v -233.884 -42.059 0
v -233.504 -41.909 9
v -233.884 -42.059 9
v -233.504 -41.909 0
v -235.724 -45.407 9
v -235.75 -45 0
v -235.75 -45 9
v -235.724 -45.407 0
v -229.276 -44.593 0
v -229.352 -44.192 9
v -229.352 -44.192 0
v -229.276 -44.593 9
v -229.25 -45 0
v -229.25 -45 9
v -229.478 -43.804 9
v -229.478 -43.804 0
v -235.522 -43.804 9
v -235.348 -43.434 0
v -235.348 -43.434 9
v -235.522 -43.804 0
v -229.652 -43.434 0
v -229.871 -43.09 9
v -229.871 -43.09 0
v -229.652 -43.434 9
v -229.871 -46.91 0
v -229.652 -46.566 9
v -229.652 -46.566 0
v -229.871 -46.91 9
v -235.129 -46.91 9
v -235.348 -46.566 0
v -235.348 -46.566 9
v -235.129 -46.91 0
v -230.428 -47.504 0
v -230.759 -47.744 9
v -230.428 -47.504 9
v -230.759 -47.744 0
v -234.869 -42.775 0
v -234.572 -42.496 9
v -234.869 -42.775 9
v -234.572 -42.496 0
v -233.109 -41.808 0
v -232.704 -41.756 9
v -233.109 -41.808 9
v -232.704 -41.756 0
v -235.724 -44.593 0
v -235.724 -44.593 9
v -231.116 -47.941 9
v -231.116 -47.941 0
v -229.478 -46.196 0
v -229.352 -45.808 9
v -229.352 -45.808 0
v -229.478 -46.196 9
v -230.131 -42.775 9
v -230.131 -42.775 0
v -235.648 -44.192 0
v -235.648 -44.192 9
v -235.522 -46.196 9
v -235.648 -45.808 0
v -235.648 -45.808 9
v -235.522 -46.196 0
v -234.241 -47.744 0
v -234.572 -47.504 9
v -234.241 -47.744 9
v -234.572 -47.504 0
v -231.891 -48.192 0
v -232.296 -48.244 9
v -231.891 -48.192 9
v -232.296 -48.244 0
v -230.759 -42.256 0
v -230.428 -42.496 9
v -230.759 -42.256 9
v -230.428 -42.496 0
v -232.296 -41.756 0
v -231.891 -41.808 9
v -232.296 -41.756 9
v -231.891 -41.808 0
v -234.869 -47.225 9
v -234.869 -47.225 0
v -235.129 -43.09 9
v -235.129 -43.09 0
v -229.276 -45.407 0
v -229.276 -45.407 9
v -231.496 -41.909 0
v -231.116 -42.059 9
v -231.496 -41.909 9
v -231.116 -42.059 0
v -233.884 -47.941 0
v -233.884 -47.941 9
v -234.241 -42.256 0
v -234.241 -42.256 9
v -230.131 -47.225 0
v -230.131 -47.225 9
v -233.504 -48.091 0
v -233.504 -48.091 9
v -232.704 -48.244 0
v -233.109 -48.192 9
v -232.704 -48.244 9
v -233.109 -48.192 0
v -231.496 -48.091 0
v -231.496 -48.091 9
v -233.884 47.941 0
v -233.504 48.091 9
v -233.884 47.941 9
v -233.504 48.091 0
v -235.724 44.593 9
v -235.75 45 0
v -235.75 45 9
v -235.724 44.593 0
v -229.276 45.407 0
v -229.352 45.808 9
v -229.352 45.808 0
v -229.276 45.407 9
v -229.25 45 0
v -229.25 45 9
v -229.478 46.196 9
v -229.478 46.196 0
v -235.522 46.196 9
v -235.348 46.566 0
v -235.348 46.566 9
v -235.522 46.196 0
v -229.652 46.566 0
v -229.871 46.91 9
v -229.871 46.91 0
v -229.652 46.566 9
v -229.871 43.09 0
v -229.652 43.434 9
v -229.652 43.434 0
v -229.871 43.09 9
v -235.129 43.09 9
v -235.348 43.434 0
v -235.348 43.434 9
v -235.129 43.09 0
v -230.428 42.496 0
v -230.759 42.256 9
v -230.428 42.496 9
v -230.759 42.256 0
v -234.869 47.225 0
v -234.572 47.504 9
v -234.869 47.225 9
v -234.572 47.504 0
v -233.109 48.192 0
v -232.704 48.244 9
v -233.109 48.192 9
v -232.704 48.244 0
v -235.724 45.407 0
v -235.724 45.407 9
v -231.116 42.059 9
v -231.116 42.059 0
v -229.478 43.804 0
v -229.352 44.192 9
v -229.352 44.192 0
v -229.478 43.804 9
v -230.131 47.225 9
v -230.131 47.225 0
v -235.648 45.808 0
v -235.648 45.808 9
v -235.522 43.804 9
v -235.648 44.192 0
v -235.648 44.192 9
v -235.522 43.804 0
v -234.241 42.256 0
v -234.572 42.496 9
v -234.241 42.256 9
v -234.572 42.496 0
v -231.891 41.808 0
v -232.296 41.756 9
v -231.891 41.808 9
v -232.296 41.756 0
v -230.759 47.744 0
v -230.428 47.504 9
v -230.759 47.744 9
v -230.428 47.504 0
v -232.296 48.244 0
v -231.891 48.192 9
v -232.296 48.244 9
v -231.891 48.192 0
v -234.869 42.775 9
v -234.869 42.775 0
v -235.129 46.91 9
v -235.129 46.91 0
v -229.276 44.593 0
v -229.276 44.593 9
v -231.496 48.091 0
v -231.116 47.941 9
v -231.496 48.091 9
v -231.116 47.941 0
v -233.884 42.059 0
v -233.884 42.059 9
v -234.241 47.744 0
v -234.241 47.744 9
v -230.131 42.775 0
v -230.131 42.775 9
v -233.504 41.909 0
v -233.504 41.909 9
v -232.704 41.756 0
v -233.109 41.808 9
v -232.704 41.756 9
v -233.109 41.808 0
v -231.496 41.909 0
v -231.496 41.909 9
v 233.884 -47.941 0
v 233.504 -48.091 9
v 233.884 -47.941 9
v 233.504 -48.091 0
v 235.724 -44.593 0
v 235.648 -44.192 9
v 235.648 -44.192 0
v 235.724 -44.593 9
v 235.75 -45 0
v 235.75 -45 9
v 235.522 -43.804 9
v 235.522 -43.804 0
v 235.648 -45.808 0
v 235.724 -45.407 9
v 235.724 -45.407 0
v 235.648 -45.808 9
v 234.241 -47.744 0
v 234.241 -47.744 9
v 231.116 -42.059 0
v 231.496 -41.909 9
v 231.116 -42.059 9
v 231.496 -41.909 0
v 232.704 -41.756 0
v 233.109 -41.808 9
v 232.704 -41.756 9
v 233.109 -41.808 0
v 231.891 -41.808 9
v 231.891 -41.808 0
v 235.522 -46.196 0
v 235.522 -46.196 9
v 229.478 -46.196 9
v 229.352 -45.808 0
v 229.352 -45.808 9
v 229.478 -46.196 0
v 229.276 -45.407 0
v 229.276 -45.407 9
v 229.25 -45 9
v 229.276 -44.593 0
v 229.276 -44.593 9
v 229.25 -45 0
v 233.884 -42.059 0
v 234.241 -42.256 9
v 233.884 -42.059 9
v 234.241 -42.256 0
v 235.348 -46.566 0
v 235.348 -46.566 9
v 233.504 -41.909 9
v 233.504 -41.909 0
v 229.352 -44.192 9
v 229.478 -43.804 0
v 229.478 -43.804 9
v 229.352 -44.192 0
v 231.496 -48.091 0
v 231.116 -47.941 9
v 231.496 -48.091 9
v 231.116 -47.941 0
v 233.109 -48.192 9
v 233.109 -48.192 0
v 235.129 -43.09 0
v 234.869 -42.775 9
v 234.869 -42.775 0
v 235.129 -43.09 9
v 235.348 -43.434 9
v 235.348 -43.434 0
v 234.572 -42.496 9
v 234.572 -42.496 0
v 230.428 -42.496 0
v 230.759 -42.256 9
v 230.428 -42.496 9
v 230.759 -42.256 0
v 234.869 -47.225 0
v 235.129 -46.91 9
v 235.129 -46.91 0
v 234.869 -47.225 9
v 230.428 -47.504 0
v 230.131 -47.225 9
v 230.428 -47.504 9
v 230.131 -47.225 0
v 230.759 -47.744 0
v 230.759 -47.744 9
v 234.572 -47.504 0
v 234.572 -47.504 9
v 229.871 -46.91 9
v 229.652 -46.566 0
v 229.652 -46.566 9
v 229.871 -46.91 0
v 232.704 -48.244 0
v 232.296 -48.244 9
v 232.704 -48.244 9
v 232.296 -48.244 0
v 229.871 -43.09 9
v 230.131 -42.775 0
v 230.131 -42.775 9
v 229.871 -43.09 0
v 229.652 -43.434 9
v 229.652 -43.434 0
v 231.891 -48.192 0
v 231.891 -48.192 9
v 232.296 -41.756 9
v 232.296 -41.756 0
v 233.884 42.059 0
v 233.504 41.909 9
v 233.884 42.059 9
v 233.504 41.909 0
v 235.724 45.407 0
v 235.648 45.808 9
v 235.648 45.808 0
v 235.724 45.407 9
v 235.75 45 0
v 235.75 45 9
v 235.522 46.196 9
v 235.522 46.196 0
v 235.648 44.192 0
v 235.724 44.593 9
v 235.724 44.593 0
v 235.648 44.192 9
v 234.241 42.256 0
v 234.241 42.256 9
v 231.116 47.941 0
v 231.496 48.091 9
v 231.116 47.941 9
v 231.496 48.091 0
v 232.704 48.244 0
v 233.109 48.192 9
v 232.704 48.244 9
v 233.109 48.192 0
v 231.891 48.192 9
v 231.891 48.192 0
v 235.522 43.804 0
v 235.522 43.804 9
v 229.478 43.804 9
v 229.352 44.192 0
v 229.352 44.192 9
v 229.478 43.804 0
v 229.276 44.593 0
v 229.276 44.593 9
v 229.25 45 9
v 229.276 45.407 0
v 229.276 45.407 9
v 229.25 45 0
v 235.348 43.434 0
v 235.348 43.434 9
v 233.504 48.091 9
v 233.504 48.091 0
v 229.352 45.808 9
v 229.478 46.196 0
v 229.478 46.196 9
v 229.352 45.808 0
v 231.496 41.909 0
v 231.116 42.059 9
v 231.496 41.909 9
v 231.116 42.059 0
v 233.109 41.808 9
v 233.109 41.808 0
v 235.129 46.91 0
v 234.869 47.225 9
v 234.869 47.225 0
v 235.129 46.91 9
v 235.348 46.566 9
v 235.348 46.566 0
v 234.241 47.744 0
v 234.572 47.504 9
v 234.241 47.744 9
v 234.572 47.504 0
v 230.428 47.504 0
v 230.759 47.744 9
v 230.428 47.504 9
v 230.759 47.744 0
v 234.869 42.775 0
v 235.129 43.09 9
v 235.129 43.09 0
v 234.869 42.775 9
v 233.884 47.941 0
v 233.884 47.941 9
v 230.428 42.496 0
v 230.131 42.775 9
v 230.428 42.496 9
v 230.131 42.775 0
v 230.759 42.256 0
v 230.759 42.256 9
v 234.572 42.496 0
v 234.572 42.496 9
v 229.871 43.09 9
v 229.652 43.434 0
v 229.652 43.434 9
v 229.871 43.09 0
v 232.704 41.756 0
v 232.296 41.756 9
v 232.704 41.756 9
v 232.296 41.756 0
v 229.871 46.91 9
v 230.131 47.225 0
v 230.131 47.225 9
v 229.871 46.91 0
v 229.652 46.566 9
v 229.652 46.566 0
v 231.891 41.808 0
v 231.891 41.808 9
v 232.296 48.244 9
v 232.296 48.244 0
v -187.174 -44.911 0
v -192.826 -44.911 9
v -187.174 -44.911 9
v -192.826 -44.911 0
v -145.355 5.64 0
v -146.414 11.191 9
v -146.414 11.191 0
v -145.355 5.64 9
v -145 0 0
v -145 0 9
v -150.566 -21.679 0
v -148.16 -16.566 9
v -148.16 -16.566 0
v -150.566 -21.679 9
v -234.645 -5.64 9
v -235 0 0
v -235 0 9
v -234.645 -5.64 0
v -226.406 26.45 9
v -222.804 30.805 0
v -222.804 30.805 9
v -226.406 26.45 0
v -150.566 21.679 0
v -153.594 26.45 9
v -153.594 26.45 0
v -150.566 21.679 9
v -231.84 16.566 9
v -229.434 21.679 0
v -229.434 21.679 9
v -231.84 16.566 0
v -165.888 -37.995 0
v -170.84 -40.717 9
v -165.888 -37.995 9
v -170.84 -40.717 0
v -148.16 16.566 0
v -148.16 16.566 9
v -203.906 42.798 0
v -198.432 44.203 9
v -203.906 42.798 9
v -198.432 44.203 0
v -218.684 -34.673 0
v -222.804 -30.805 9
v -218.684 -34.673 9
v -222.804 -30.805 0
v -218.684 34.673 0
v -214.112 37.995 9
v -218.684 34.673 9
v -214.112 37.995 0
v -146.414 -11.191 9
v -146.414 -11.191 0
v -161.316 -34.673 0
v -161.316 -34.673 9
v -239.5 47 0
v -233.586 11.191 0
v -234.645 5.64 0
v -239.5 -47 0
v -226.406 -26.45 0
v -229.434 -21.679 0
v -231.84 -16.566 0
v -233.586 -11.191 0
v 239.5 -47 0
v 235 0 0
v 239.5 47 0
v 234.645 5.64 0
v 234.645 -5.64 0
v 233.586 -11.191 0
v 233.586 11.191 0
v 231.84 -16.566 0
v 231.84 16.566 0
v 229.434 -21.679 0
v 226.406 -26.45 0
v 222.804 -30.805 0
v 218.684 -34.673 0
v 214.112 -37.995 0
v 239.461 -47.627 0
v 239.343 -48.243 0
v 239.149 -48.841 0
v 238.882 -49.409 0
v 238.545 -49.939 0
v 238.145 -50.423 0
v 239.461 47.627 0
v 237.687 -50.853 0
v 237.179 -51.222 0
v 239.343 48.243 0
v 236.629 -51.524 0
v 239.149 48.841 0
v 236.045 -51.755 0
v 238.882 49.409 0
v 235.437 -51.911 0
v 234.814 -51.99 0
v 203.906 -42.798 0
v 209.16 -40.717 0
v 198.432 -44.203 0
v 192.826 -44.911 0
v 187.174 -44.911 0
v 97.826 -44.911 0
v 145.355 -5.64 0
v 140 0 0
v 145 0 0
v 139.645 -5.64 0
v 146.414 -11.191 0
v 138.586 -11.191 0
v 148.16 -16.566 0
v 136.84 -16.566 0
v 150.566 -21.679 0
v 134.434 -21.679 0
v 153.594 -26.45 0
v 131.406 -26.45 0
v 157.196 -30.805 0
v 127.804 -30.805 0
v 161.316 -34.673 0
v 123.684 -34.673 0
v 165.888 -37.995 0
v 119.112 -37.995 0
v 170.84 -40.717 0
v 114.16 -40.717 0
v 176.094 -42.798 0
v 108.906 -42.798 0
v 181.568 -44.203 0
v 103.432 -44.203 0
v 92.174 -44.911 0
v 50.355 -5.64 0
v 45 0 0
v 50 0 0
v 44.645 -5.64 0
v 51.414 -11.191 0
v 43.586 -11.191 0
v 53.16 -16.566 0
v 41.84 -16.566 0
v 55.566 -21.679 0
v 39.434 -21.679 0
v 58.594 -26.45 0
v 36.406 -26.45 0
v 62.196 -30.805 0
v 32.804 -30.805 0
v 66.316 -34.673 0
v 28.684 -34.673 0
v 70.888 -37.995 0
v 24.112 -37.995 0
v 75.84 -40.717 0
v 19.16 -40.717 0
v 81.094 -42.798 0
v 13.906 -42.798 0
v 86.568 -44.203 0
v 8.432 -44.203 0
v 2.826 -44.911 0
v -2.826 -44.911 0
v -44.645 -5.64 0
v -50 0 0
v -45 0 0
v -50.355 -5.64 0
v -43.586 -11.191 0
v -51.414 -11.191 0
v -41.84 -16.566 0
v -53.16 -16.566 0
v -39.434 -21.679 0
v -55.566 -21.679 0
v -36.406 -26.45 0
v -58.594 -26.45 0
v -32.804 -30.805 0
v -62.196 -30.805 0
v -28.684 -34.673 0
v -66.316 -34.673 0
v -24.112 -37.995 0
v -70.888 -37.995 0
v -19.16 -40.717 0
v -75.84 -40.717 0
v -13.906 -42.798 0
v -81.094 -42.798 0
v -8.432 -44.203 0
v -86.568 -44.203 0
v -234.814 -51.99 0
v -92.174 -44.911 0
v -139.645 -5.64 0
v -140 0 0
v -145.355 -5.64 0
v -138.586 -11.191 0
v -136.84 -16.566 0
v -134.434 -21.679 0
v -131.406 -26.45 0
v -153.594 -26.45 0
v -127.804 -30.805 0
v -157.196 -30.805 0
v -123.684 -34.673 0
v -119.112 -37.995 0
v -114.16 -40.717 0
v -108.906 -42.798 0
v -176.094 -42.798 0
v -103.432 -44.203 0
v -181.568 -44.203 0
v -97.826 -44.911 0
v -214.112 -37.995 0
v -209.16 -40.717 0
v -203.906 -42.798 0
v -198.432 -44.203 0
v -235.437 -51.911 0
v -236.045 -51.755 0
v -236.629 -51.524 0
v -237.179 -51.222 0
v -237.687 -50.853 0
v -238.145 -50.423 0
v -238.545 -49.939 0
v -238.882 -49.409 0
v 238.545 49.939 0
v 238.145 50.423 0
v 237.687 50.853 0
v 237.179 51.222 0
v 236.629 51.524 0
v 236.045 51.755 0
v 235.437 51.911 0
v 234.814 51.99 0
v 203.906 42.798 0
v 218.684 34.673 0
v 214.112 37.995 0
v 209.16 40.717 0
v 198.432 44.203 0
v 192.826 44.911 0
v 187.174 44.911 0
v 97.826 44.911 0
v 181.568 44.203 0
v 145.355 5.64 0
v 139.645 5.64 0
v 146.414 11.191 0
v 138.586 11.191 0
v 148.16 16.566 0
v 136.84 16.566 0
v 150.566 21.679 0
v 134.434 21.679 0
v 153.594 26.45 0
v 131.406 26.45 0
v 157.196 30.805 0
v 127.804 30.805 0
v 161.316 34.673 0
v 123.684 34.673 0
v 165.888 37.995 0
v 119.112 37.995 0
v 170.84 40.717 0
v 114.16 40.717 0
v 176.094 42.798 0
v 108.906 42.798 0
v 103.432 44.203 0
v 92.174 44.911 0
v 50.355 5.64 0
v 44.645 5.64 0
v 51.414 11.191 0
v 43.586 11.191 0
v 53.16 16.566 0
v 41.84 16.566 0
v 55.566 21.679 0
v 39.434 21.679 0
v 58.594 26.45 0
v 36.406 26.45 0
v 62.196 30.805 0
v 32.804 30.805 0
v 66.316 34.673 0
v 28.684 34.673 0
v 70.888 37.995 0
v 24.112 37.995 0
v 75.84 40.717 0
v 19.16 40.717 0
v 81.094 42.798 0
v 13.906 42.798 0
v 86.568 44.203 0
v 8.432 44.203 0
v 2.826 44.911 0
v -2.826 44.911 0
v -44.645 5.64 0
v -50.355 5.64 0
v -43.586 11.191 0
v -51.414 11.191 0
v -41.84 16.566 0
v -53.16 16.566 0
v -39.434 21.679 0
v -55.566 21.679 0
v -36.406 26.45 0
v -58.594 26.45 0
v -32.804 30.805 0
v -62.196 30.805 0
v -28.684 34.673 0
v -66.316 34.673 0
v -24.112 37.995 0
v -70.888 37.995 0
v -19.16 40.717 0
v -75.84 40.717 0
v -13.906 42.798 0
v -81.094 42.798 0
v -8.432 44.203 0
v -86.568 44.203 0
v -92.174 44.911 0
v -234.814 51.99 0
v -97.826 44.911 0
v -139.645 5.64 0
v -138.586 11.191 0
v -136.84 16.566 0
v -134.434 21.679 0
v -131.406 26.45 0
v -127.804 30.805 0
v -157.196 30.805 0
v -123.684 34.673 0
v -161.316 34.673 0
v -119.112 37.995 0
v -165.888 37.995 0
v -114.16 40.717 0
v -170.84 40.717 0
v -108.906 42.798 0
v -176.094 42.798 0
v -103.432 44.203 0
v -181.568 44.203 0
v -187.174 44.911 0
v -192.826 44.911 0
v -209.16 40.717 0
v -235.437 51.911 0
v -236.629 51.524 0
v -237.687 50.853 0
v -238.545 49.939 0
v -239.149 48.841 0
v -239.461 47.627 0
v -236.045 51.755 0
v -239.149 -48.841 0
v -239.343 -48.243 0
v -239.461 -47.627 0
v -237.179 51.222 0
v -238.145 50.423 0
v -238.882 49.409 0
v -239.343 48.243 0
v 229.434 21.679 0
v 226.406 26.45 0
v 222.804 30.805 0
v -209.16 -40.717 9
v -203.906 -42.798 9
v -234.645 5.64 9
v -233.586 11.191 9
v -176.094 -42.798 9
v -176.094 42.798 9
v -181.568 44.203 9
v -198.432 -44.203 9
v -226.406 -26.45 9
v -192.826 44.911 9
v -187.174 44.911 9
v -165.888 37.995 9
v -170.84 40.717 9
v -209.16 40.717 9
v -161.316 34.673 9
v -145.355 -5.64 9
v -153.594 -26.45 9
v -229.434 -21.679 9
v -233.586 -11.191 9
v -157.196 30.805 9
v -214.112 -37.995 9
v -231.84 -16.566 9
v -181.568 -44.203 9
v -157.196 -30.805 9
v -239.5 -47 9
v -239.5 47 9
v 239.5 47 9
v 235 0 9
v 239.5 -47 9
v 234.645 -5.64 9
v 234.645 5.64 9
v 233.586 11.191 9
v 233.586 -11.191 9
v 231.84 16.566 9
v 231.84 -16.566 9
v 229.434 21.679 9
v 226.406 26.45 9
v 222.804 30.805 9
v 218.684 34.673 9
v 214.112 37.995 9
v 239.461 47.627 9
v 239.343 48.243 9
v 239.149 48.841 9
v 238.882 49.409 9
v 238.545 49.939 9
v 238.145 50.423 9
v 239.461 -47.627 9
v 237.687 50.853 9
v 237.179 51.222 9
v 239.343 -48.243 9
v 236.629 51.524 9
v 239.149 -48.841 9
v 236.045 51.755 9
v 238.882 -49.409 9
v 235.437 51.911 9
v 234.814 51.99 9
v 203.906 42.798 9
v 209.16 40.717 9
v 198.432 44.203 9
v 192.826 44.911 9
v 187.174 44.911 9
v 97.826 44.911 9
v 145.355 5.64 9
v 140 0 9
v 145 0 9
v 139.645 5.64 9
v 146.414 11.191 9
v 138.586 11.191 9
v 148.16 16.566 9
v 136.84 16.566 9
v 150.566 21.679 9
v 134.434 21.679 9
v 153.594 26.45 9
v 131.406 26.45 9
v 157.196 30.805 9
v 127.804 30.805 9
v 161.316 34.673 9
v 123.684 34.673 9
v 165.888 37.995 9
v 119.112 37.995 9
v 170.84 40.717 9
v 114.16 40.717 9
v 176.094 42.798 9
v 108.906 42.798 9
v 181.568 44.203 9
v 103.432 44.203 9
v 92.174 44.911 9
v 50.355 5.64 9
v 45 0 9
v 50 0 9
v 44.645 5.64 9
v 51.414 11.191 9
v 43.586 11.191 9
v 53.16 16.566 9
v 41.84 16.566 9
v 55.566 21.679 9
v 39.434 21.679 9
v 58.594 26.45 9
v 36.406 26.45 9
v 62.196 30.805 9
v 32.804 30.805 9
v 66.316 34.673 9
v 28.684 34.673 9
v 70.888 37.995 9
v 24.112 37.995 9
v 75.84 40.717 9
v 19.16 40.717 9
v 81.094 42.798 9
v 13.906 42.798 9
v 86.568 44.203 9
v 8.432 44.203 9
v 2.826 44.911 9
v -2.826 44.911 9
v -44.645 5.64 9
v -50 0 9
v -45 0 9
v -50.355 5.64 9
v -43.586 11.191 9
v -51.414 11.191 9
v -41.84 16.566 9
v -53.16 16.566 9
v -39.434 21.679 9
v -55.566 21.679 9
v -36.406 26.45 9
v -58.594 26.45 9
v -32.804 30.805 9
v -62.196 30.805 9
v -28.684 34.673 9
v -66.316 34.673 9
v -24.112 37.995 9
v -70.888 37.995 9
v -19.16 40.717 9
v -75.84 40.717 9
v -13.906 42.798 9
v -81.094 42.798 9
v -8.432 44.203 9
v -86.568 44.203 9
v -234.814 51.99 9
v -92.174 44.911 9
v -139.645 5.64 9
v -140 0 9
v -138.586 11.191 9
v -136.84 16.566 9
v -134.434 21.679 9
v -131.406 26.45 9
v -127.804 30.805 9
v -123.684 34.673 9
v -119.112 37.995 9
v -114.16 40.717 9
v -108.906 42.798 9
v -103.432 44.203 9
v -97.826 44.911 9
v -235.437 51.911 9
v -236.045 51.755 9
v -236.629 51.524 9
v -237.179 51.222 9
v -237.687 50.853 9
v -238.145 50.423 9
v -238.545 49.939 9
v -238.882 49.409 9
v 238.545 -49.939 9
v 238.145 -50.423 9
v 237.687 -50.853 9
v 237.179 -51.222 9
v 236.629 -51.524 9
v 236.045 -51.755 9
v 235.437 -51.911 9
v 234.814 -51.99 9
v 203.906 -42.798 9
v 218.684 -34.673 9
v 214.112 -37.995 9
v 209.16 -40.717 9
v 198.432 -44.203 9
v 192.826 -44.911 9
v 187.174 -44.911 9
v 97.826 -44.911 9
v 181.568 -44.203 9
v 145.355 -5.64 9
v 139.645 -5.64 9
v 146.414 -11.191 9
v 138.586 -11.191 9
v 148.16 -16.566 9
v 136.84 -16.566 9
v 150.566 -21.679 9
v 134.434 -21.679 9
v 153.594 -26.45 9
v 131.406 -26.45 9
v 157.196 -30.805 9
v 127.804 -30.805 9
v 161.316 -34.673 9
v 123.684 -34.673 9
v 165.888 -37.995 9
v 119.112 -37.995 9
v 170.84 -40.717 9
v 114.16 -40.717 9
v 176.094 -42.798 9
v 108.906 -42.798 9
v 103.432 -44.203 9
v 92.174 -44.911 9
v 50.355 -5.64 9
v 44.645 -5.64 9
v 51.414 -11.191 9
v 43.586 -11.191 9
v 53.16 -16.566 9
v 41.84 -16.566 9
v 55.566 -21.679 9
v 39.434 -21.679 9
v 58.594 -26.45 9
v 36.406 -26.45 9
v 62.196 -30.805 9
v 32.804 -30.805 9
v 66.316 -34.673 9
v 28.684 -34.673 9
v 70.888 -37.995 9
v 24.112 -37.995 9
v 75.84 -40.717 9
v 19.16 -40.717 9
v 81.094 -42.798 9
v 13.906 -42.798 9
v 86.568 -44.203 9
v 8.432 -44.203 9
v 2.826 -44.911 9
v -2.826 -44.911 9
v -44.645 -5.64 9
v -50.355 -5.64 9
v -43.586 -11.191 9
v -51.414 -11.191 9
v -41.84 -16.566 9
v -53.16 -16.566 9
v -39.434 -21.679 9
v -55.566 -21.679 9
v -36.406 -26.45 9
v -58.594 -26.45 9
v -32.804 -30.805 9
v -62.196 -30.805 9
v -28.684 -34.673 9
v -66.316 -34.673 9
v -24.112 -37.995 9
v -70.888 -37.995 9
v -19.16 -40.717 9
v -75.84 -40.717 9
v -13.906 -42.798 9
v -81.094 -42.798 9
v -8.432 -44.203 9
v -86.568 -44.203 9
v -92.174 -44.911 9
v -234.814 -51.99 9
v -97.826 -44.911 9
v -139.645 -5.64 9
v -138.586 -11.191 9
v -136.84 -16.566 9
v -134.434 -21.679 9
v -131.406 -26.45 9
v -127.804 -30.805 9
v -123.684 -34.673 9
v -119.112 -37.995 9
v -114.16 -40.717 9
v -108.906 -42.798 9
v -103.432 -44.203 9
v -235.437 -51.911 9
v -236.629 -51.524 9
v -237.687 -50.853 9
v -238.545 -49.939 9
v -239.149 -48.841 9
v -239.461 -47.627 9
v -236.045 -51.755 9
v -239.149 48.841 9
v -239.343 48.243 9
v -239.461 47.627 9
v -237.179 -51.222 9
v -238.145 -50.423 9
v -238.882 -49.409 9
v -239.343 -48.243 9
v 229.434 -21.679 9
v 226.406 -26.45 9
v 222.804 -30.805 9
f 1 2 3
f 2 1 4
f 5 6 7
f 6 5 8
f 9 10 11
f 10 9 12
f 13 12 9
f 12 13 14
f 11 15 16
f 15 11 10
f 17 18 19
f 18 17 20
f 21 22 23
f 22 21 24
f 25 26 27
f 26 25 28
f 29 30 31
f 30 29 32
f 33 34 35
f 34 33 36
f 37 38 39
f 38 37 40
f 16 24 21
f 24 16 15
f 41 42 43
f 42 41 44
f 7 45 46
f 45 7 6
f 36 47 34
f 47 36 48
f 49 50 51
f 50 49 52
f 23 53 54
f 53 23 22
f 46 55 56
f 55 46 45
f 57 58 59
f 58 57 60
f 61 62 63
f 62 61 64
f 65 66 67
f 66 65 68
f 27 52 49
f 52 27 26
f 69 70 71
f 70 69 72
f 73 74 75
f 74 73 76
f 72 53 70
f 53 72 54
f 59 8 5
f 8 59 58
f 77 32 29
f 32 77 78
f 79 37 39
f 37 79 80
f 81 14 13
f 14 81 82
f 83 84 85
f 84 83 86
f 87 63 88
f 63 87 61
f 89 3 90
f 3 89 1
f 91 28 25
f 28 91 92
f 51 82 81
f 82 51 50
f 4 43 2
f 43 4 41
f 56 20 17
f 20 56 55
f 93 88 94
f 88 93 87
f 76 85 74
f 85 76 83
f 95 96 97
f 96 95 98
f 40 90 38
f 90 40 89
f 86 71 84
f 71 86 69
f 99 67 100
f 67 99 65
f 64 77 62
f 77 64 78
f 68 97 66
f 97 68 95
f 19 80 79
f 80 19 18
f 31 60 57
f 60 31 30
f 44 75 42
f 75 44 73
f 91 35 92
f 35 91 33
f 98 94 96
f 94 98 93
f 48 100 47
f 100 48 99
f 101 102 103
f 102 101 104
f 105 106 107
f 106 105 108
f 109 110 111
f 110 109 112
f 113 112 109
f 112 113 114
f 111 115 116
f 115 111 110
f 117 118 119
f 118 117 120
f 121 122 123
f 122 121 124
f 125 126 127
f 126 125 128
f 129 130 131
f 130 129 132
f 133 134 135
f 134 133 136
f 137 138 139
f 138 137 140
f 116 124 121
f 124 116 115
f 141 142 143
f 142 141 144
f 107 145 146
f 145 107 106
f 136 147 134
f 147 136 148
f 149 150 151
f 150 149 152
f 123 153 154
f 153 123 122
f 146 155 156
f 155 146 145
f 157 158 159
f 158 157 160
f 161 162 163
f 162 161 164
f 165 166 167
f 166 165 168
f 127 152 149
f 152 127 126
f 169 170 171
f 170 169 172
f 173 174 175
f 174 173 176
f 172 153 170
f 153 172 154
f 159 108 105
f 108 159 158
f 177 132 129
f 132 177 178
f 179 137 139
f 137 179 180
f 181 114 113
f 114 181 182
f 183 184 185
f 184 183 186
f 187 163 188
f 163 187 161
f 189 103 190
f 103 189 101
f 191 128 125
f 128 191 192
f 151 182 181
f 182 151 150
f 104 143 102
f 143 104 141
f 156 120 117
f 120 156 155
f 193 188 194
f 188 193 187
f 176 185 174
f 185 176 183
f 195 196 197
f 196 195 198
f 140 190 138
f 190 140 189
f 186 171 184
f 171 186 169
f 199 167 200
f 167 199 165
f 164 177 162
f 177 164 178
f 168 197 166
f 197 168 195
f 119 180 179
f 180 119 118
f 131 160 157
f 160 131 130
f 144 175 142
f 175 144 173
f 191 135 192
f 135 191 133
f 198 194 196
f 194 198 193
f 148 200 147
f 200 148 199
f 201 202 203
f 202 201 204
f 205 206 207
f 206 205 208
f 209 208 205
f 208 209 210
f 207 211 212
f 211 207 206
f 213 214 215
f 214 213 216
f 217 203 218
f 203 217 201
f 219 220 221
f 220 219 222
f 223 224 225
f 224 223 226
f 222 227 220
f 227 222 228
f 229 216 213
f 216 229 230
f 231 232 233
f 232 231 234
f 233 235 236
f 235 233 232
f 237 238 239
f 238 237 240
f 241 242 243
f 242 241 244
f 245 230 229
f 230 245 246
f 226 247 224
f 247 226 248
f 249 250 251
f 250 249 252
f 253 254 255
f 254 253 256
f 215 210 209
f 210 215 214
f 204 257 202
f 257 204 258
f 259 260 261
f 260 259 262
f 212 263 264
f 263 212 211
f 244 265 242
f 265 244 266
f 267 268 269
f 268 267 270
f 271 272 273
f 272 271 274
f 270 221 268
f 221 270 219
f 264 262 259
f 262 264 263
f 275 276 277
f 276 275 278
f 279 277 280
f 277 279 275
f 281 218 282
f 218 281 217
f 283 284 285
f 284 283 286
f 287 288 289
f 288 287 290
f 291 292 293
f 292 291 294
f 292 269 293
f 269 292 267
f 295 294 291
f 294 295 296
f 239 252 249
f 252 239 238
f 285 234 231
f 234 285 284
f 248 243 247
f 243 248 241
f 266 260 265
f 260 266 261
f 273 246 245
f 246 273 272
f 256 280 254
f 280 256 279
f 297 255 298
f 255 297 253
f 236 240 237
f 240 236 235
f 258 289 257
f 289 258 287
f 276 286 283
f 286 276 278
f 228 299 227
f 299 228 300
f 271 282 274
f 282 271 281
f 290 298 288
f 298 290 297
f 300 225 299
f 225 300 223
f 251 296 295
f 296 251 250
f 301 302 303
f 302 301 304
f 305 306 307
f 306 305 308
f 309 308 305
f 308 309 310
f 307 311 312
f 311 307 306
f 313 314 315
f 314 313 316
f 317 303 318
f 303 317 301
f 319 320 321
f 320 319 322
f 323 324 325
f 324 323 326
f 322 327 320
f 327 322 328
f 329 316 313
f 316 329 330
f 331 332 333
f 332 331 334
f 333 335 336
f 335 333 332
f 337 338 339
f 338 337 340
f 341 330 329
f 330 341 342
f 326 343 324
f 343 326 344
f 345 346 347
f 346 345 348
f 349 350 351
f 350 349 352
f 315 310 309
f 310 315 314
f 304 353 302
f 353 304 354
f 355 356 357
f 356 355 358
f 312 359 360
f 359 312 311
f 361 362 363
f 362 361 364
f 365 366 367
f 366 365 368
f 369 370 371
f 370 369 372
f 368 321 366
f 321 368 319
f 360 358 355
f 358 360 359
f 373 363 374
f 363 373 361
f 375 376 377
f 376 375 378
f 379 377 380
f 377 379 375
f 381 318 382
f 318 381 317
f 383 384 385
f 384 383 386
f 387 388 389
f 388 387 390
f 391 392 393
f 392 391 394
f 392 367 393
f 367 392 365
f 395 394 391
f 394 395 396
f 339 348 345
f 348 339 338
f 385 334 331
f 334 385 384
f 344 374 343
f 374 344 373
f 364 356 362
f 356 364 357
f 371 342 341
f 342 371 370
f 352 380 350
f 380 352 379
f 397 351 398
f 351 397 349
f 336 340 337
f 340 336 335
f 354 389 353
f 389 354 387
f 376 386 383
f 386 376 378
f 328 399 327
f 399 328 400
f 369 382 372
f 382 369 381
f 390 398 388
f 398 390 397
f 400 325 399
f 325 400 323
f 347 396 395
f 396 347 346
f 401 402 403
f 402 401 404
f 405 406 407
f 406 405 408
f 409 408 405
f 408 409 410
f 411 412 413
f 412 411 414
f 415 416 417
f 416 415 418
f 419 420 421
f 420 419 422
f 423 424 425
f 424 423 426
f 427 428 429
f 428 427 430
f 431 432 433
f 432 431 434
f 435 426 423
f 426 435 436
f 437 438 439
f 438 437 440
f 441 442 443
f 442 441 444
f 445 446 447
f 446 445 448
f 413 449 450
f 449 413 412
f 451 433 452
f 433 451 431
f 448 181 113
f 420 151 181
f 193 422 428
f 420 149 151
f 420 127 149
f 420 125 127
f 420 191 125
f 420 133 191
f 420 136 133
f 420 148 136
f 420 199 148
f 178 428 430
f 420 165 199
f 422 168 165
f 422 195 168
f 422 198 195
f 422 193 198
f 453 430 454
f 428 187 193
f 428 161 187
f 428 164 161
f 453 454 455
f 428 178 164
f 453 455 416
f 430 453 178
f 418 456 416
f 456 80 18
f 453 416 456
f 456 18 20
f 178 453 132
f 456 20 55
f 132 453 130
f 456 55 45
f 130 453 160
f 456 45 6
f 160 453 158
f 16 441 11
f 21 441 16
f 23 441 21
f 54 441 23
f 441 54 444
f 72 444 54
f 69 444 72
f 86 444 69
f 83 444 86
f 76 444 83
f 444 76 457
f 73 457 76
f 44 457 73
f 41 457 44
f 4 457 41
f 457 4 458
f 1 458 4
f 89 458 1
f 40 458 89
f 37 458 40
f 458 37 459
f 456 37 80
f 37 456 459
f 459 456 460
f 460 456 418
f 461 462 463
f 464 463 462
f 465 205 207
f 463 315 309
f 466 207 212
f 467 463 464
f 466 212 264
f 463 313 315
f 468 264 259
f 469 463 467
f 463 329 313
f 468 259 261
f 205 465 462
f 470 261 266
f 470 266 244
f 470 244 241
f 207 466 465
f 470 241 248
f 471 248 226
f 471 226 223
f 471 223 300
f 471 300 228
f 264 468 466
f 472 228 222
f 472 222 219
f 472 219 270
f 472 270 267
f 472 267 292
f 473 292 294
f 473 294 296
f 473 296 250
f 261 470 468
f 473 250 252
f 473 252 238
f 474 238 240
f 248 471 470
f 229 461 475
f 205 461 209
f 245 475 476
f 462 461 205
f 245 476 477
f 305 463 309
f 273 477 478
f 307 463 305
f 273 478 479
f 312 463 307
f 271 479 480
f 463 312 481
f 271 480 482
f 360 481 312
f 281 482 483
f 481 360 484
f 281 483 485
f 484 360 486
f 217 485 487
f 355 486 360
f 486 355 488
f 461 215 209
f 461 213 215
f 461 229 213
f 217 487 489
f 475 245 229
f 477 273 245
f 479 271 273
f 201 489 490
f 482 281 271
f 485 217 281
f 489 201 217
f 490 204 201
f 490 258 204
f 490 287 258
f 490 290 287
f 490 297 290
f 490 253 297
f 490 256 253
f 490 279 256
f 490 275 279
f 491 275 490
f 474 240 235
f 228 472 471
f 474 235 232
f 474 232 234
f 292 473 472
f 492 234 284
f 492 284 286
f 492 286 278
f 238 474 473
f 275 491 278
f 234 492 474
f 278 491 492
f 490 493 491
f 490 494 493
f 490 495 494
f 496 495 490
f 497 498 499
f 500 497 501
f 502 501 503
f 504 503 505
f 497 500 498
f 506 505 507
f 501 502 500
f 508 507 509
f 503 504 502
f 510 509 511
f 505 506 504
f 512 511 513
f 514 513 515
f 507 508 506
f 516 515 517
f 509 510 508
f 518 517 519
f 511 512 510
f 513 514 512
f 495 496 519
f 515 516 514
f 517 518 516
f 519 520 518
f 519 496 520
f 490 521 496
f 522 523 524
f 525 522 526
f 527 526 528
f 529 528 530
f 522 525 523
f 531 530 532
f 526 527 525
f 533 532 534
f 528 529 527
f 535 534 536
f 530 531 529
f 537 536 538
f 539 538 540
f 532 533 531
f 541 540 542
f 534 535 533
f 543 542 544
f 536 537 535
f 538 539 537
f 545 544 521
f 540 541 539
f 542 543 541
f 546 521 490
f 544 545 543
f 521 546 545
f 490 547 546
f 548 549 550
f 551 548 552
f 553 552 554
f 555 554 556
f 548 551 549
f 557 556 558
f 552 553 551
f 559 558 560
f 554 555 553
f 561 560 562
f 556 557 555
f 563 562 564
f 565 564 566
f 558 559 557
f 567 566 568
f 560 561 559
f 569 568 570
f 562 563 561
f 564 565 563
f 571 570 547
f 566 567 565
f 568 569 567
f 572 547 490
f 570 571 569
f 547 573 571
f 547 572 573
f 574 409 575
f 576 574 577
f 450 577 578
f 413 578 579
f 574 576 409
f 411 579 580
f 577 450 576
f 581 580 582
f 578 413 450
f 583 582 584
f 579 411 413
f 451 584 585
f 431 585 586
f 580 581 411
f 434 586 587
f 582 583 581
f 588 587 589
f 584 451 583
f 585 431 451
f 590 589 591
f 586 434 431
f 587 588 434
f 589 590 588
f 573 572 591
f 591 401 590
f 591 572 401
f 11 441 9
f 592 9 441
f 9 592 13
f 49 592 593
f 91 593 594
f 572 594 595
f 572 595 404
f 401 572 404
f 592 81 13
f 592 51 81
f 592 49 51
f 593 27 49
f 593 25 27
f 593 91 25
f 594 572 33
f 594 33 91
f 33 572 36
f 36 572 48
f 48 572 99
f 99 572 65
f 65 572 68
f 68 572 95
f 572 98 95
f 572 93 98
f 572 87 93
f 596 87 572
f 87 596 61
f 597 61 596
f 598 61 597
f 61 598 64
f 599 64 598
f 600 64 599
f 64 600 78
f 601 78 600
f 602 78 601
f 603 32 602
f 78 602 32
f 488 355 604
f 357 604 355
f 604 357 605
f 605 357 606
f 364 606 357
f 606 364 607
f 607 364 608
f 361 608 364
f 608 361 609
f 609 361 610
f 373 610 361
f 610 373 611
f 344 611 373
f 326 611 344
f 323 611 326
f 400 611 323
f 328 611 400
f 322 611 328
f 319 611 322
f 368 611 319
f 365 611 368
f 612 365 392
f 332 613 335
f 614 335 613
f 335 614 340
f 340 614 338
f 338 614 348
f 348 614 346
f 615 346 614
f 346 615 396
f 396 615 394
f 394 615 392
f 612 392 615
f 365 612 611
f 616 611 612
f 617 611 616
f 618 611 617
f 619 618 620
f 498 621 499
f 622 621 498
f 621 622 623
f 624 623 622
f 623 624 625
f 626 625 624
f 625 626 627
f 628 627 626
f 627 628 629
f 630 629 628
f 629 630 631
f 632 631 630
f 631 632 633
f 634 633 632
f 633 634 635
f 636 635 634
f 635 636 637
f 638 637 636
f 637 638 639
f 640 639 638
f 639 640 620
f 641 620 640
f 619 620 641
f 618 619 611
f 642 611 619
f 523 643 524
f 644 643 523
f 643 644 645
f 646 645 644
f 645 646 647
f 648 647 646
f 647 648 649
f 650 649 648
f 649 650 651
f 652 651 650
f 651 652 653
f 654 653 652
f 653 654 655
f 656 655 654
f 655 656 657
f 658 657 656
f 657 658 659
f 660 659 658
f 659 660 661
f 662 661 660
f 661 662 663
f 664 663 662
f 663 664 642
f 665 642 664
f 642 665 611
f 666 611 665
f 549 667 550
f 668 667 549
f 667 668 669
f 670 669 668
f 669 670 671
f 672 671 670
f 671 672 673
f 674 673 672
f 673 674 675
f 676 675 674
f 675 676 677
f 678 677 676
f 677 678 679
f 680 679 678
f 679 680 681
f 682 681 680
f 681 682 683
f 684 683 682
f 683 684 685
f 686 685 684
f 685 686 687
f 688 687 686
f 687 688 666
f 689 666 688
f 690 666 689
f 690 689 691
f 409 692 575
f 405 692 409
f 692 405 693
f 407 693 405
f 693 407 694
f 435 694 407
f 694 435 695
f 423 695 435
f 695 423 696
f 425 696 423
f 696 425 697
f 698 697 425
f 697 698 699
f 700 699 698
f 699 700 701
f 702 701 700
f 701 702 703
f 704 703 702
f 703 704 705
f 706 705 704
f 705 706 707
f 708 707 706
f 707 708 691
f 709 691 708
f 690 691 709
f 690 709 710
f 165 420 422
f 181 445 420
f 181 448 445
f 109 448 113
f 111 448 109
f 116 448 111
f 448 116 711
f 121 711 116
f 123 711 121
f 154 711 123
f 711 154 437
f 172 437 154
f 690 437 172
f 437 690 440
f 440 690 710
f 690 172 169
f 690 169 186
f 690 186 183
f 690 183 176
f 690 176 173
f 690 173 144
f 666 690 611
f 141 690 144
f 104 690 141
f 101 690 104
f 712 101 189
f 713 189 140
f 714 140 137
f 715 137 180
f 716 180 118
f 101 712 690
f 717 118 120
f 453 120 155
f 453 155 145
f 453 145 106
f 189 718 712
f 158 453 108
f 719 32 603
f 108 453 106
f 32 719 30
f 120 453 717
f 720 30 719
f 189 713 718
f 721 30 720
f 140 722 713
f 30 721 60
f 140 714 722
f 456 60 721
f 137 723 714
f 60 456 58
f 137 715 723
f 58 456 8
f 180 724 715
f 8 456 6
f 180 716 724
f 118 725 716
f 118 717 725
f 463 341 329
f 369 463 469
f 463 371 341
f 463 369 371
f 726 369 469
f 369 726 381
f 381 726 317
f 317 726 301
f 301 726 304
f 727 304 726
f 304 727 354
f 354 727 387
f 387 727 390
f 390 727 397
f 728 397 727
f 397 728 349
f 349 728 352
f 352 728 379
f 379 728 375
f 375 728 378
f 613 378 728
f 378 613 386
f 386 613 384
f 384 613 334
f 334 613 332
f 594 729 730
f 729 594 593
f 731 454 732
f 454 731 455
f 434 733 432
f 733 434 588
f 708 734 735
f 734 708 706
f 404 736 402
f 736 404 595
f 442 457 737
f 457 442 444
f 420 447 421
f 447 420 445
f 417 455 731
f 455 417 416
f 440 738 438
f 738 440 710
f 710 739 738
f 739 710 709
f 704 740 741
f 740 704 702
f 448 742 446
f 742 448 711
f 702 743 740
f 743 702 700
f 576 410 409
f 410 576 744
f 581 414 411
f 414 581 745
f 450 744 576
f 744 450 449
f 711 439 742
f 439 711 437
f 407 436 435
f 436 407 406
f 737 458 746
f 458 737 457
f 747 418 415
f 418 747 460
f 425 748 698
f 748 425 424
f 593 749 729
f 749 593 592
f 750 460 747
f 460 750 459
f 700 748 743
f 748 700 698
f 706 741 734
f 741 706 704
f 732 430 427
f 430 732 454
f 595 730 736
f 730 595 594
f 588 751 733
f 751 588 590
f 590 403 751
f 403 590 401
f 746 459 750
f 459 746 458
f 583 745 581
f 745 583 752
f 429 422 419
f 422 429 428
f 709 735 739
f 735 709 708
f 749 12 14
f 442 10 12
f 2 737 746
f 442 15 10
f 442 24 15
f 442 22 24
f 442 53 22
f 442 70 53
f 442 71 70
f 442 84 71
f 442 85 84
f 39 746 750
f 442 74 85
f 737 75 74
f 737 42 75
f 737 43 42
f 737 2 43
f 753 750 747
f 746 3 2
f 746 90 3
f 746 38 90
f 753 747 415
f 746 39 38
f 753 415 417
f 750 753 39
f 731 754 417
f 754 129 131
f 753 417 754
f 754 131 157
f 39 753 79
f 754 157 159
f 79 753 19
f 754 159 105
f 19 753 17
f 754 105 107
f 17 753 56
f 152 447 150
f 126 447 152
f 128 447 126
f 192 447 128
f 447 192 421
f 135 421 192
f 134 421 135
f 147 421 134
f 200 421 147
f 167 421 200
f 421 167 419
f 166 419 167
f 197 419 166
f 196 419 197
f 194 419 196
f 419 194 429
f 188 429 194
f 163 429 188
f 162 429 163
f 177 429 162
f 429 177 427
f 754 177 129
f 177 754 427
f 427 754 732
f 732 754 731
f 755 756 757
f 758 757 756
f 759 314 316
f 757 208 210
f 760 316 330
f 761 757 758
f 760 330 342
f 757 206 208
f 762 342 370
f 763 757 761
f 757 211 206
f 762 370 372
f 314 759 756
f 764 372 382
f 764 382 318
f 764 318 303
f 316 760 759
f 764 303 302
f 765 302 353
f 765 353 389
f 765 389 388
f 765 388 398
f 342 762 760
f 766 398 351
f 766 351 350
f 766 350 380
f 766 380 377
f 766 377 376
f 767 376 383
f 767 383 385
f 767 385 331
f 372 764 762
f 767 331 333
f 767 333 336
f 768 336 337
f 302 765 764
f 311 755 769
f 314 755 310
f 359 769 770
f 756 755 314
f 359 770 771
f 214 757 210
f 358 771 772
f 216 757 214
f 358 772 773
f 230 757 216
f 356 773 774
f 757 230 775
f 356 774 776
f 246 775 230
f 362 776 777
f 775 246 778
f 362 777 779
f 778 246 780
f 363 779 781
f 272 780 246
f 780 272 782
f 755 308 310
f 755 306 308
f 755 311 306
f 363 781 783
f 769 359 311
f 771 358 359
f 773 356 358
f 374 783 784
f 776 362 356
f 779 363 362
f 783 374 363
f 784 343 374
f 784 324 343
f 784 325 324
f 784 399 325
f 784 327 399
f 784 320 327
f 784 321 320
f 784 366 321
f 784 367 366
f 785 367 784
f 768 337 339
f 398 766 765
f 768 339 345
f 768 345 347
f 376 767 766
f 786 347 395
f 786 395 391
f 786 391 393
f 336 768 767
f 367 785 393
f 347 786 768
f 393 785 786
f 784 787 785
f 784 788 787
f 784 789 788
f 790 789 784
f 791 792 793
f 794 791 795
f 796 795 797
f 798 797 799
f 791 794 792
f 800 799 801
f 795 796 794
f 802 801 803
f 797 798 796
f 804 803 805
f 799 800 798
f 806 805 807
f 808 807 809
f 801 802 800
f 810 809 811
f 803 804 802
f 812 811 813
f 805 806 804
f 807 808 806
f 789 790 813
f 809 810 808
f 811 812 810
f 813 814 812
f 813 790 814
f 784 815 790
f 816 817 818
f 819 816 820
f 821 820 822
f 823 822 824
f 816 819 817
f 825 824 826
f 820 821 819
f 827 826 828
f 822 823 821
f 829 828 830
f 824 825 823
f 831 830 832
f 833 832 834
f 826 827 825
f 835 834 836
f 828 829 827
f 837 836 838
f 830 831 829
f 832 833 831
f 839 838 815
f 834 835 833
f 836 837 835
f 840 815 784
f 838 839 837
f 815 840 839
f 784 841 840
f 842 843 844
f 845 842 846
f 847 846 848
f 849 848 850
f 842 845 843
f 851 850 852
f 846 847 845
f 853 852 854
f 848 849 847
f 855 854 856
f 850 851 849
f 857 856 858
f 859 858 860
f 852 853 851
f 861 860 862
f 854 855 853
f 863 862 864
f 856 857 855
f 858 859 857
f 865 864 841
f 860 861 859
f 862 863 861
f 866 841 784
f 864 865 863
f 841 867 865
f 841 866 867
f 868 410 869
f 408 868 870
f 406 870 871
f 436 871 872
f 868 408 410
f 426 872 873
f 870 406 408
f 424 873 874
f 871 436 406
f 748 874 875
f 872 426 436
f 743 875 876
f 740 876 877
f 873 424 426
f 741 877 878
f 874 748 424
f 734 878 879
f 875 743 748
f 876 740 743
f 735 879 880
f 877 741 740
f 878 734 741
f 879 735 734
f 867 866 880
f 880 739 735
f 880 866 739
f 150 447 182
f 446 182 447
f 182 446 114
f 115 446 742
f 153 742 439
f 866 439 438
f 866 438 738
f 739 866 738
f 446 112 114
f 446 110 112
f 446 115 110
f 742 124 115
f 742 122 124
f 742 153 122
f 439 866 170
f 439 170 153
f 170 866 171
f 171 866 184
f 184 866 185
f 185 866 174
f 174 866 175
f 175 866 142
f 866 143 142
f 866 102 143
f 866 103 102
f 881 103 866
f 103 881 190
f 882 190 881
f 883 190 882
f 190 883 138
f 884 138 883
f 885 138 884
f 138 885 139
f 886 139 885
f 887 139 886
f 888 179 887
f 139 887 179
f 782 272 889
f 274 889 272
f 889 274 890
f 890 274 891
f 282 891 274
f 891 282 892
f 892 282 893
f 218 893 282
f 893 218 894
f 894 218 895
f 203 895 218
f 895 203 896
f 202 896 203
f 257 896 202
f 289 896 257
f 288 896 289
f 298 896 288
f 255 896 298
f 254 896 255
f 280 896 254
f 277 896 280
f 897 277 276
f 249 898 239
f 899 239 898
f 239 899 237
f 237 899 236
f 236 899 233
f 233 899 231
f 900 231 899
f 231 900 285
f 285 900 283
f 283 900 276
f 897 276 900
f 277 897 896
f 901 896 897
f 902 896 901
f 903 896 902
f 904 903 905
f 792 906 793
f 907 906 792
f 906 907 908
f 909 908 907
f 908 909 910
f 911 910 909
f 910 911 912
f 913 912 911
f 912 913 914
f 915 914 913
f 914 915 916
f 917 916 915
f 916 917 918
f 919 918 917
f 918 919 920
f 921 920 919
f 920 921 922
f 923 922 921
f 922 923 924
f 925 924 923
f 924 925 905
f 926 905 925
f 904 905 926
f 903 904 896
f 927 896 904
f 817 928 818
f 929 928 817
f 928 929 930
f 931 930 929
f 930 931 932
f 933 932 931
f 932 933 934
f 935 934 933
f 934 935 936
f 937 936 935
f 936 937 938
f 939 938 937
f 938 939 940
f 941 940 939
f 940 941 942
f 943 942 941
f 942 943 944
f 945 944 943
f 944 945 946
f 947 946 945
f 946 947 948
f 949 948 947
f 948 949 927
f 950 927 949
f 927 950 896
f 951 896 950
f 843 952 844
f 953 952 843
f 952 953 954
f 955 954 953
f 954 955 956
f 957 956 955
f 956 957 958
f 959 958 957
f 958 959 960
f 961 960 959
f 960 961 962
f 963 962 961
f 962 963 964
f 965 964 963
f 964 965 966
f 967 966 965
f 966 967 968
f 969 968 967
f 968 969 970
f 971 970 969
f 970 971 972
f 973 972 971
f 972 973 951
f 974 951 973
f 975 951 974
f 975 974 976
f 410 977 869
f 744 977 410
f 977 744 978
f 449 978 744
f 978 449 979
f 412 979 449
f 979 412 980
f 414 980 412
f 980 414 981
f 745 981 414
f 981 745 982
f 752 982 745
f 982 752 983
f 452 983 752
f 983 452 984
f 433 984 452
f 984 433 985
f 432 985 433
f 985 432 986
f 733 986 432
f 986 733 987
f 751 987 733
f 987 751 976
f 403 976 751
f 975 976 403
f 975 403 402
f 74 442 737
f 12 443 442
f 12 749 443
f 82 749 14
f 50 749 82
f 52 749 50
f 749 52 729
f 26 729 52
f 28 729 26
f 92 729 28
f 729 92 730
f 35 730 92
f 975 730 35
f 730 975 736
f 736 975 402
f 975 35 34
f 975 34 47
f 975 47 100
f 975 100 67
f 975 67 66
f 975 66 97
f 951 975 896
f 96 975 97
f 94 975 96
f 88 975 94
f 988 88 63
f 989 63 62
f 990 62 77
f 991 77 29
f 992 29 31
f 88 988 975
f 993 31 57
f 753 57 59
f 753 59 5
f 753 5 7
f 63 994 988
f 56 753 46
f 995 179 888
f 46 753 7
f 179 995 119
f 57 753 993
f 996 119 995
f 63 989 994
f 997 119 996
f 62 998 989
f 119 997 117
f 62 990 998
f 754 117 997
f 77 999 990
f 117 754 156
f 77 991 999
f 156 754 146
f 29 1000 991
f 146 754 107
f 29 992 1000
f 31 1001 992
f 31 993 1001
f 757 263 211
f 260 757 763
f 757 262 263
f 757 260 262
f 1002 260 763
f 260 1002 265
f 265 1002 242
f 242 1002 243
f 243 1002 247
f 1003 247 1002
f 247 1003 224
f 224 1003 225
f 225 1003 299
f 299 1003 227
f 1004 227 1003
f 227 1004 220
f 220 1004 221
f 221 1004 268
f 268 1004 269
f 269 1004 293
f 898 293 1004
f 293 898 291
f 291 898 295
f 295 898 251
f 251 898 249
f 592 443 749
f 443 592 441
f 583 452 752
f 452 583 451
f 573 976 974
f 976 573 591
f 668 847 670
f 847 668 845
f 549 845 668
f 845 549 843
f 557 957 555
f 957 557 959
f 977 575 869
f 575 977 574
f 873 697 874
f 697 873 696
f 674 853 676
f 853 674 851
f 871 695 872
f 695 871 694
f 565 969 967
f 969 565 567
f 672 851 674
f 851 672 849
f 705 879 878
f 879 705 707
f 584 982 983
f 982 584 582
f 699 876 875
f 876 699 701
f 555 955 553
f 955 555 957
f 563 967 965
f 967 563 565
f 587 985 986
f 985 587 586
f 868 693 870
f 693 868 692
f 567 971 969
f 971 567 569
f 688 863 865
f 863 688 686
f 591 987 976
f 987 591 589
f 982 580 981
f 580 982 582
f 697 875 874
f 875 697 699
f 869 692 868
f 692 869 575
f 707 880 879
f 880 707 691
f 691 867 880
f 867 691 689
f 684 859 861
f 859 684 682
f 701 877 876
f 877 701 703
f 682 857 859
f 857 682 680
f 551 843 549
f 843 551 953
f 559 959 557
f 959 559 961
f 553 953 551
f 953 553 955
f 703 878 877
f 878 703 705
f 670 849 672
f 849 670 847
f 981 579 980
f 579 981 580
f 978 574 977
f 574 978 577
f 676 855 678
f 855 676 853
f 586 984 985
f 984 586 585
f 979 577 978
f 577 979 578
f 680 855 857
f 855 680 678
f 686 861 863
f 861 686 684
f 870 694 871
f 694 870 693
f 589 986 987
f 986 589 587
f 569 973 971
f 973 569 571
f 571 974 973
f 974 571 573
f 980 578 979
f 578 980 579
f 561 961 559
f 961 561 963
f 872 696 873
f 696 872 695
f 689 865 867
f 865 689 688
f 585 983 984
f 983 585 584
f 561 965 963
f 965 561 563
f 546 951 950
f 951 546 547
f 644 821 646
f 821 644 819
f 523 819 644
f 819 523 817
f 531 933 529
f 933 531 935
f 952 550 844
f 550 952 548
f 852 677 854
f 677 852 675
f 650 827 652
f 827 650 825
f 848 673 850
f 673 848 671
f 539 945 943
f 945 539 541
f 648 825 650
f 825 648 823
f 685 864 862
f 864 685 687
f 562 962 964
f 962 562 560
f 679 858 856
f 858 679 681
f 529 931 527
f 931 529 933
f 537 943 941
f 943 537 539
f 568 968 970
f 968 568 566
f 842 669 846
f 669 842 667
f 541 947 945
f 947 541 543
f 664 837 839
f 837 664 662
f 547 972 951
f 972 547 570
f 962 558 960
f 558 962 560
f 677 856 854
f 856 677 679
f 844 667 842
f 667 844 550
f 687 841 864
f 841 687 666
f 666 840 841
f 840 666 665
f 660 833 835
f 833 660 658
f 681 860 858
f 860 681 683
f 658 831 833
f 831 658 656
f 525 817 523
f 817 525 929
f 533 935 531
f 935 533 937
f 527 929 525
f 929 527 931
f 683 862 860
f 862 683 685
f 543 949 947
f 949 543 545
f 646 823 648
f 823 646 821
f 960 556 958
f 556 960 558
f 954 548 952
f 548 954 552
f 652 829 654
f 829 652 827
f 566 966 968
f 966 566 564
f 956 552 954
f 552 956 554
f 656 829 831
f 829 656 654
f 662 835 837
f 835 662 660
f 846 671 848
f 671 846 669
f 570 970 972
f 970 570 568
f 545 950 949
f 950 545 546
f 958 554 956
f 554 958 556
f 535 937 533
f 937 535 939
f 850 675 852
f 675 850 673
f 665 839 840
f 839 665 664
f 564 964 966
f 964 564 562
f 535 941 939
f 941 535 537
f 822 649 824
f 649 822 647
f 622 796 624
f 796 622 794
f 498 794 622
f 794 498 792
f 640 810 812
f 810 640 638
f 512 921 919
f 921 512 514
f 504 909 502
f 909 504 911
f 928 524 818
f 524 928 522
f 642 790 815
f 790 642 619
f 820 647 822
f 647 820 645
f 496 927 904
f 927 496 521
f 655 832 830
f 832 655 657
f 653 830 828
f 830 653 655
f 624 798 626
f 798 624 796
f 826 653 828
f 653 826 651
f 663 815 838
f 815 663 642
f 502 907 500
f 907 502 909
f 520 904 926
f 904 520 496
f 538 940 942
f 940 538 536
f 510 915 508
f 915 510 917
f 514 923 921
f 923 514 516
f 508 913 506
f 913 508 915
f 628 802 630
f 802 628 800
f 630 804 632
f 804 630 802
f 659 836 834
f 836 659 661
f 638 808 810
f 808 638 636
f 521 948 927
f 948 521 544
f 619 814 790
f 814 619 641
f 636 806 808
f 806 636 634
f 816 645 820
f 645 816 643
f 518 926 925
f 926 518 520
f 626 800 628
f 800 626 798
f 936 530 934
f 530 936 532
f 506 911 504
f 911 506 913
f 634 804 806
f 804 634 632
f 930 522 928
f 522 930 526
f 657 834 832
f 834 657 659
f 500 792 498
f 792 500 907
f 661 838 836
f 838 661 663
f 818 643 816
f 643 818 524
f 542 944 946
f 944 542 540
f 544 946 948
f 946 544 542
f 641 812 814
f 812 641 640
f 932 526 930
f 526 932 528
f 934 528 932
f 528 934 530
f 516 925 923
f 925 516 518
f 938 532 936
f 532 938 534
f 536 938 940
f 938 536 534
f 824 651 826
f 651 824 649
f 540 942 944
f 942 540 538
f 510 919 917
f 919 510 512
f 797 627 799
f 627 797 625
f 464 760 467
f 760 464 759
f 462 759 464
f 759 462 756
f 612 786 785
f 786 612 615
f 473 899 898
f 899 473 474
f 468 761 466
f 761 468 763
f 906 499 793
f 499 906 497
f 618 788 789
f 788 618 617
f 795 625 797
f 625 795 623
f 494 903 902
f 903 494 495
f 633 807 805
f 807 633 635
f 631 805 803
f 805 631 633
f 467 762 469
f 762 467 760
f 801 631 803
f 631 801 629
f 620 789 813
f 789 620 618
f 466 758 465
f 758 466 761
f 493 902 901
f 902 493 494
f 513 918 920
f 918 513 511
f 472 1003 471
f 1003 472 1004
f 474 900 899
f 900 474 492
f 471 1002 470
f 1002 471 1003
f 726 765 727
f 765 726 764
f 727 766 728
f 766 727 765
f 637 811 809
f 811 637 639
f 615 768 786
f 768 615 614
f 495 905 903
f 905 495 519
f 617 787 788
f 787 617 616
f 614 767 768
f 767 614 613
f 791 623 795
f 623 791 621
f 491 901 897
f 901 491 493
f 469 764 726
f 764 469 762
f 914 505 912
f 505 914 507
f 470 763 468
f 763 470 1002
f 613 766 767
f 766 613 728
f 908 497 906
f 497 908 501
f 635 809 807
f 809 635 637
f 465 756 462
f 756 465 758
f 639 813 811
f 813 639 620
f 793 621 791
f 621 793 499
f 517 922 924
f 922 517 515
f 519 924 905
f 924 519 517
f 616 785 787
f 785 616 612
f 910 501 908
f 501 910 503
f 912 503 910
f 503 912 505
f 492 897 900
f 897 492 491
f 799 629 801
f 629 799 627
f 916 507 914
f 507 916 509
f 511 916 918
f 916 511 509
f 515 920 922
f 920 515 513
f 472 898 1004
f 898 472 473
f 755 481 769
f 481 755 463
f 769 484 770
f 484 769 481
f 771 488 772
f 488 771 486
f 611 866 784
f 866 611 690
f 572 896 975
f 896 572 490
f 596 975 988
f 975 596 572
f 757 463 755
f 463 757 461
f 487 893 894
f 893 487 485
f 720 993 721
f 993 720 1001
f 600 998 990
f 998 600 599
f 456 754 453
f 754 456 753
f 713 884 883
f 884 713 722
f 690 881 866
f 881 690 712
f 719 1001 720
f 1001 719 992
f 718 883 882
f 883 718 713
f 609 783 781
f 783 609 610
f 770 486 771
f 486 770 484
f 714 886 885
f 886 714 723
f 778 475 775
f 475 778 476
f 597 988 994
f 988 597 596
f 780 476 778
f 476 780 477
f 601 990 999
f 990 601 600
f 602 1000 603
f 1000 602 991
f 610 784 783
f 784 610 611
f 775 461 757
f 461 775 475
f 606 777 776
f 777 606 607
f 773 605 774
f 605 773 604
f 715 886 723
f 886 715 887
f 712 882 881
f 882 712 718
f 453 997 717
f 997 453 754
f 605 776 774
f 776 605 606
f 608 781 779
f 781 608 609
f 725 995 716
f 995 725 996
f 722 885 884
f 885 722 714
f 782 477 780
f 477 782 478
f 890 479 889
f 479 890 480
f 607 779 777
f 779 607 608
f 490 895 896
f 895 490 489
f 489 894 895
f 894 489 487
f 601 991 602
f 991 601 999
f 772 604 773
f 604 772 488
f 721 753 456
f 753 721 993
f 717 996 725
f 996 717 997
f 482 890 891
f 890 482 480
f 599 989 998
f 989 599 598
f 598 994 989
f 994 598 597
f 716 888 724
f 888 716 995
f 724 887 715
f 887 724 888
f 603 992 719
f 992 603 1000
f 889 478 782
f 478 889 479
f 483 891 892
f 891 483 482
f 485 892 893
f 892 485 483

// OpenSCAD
$fn = 50;


difference() {
	union() {
		hull() {
			translate(v = [-234.5000000000, 47.0000000000, 0]) {
				cylinder(h = 9, r = 5);
			}
			translate(v = [234.5000000000, 47.0000000000, 0]) {
				cylinder(h = 9, r = 5);
			}
			translate(v = [-234.5000000000, -47.0000000000, 0]) {
				cylinder(h = 9, r = 5);
			}
			translate(v = [234.5000000000, -47.0000000000, 0]) {
				cylinder(h = 9, r = 5);
			}
		}
	}
	union() {
		#translate(v = [-232.5000000000, -45.0000000000, -100.0000000000]) {
			cylinder(h = 200, r = 3.2500000000);
		}
		#translate(v = [-232.5000000000, 45.0000000000, -100.0000000000]) {
			cylinder(h = 200, r = 3.2500000000);
		}
		#translate(v = [232.5000000000, -45.0000000000, -100.0000000000]) {
			cylinder(h = 200, r = 3.2500000000);
		}
		#translate(v = [232.5000000000, 45.0000000000, -100.0000000000]) {
			cylinder(h = 200, r = 3.2500000000);
		}
		#translate(v = [-190.0000000000, 0, 0]) {
			cylinder(h = 9, r = 45.0000000000);
		}
		#translate(v = [-95.0000000000, 0, 0]) {
			cylinder(h = 9, r = 45.0000000000);
		}
		#cylinder(h = 9, r = 45.0000000000);
		#translate(v = [95.0000000000, 0, 0]) {
			cylinder(h = 9, r = 45.0000000000);
		}
		#translate(v = [190.0000000000, 0, 0]) {
			cylinder(h = 9, r = 45.0000000000);
		}
	}
}
